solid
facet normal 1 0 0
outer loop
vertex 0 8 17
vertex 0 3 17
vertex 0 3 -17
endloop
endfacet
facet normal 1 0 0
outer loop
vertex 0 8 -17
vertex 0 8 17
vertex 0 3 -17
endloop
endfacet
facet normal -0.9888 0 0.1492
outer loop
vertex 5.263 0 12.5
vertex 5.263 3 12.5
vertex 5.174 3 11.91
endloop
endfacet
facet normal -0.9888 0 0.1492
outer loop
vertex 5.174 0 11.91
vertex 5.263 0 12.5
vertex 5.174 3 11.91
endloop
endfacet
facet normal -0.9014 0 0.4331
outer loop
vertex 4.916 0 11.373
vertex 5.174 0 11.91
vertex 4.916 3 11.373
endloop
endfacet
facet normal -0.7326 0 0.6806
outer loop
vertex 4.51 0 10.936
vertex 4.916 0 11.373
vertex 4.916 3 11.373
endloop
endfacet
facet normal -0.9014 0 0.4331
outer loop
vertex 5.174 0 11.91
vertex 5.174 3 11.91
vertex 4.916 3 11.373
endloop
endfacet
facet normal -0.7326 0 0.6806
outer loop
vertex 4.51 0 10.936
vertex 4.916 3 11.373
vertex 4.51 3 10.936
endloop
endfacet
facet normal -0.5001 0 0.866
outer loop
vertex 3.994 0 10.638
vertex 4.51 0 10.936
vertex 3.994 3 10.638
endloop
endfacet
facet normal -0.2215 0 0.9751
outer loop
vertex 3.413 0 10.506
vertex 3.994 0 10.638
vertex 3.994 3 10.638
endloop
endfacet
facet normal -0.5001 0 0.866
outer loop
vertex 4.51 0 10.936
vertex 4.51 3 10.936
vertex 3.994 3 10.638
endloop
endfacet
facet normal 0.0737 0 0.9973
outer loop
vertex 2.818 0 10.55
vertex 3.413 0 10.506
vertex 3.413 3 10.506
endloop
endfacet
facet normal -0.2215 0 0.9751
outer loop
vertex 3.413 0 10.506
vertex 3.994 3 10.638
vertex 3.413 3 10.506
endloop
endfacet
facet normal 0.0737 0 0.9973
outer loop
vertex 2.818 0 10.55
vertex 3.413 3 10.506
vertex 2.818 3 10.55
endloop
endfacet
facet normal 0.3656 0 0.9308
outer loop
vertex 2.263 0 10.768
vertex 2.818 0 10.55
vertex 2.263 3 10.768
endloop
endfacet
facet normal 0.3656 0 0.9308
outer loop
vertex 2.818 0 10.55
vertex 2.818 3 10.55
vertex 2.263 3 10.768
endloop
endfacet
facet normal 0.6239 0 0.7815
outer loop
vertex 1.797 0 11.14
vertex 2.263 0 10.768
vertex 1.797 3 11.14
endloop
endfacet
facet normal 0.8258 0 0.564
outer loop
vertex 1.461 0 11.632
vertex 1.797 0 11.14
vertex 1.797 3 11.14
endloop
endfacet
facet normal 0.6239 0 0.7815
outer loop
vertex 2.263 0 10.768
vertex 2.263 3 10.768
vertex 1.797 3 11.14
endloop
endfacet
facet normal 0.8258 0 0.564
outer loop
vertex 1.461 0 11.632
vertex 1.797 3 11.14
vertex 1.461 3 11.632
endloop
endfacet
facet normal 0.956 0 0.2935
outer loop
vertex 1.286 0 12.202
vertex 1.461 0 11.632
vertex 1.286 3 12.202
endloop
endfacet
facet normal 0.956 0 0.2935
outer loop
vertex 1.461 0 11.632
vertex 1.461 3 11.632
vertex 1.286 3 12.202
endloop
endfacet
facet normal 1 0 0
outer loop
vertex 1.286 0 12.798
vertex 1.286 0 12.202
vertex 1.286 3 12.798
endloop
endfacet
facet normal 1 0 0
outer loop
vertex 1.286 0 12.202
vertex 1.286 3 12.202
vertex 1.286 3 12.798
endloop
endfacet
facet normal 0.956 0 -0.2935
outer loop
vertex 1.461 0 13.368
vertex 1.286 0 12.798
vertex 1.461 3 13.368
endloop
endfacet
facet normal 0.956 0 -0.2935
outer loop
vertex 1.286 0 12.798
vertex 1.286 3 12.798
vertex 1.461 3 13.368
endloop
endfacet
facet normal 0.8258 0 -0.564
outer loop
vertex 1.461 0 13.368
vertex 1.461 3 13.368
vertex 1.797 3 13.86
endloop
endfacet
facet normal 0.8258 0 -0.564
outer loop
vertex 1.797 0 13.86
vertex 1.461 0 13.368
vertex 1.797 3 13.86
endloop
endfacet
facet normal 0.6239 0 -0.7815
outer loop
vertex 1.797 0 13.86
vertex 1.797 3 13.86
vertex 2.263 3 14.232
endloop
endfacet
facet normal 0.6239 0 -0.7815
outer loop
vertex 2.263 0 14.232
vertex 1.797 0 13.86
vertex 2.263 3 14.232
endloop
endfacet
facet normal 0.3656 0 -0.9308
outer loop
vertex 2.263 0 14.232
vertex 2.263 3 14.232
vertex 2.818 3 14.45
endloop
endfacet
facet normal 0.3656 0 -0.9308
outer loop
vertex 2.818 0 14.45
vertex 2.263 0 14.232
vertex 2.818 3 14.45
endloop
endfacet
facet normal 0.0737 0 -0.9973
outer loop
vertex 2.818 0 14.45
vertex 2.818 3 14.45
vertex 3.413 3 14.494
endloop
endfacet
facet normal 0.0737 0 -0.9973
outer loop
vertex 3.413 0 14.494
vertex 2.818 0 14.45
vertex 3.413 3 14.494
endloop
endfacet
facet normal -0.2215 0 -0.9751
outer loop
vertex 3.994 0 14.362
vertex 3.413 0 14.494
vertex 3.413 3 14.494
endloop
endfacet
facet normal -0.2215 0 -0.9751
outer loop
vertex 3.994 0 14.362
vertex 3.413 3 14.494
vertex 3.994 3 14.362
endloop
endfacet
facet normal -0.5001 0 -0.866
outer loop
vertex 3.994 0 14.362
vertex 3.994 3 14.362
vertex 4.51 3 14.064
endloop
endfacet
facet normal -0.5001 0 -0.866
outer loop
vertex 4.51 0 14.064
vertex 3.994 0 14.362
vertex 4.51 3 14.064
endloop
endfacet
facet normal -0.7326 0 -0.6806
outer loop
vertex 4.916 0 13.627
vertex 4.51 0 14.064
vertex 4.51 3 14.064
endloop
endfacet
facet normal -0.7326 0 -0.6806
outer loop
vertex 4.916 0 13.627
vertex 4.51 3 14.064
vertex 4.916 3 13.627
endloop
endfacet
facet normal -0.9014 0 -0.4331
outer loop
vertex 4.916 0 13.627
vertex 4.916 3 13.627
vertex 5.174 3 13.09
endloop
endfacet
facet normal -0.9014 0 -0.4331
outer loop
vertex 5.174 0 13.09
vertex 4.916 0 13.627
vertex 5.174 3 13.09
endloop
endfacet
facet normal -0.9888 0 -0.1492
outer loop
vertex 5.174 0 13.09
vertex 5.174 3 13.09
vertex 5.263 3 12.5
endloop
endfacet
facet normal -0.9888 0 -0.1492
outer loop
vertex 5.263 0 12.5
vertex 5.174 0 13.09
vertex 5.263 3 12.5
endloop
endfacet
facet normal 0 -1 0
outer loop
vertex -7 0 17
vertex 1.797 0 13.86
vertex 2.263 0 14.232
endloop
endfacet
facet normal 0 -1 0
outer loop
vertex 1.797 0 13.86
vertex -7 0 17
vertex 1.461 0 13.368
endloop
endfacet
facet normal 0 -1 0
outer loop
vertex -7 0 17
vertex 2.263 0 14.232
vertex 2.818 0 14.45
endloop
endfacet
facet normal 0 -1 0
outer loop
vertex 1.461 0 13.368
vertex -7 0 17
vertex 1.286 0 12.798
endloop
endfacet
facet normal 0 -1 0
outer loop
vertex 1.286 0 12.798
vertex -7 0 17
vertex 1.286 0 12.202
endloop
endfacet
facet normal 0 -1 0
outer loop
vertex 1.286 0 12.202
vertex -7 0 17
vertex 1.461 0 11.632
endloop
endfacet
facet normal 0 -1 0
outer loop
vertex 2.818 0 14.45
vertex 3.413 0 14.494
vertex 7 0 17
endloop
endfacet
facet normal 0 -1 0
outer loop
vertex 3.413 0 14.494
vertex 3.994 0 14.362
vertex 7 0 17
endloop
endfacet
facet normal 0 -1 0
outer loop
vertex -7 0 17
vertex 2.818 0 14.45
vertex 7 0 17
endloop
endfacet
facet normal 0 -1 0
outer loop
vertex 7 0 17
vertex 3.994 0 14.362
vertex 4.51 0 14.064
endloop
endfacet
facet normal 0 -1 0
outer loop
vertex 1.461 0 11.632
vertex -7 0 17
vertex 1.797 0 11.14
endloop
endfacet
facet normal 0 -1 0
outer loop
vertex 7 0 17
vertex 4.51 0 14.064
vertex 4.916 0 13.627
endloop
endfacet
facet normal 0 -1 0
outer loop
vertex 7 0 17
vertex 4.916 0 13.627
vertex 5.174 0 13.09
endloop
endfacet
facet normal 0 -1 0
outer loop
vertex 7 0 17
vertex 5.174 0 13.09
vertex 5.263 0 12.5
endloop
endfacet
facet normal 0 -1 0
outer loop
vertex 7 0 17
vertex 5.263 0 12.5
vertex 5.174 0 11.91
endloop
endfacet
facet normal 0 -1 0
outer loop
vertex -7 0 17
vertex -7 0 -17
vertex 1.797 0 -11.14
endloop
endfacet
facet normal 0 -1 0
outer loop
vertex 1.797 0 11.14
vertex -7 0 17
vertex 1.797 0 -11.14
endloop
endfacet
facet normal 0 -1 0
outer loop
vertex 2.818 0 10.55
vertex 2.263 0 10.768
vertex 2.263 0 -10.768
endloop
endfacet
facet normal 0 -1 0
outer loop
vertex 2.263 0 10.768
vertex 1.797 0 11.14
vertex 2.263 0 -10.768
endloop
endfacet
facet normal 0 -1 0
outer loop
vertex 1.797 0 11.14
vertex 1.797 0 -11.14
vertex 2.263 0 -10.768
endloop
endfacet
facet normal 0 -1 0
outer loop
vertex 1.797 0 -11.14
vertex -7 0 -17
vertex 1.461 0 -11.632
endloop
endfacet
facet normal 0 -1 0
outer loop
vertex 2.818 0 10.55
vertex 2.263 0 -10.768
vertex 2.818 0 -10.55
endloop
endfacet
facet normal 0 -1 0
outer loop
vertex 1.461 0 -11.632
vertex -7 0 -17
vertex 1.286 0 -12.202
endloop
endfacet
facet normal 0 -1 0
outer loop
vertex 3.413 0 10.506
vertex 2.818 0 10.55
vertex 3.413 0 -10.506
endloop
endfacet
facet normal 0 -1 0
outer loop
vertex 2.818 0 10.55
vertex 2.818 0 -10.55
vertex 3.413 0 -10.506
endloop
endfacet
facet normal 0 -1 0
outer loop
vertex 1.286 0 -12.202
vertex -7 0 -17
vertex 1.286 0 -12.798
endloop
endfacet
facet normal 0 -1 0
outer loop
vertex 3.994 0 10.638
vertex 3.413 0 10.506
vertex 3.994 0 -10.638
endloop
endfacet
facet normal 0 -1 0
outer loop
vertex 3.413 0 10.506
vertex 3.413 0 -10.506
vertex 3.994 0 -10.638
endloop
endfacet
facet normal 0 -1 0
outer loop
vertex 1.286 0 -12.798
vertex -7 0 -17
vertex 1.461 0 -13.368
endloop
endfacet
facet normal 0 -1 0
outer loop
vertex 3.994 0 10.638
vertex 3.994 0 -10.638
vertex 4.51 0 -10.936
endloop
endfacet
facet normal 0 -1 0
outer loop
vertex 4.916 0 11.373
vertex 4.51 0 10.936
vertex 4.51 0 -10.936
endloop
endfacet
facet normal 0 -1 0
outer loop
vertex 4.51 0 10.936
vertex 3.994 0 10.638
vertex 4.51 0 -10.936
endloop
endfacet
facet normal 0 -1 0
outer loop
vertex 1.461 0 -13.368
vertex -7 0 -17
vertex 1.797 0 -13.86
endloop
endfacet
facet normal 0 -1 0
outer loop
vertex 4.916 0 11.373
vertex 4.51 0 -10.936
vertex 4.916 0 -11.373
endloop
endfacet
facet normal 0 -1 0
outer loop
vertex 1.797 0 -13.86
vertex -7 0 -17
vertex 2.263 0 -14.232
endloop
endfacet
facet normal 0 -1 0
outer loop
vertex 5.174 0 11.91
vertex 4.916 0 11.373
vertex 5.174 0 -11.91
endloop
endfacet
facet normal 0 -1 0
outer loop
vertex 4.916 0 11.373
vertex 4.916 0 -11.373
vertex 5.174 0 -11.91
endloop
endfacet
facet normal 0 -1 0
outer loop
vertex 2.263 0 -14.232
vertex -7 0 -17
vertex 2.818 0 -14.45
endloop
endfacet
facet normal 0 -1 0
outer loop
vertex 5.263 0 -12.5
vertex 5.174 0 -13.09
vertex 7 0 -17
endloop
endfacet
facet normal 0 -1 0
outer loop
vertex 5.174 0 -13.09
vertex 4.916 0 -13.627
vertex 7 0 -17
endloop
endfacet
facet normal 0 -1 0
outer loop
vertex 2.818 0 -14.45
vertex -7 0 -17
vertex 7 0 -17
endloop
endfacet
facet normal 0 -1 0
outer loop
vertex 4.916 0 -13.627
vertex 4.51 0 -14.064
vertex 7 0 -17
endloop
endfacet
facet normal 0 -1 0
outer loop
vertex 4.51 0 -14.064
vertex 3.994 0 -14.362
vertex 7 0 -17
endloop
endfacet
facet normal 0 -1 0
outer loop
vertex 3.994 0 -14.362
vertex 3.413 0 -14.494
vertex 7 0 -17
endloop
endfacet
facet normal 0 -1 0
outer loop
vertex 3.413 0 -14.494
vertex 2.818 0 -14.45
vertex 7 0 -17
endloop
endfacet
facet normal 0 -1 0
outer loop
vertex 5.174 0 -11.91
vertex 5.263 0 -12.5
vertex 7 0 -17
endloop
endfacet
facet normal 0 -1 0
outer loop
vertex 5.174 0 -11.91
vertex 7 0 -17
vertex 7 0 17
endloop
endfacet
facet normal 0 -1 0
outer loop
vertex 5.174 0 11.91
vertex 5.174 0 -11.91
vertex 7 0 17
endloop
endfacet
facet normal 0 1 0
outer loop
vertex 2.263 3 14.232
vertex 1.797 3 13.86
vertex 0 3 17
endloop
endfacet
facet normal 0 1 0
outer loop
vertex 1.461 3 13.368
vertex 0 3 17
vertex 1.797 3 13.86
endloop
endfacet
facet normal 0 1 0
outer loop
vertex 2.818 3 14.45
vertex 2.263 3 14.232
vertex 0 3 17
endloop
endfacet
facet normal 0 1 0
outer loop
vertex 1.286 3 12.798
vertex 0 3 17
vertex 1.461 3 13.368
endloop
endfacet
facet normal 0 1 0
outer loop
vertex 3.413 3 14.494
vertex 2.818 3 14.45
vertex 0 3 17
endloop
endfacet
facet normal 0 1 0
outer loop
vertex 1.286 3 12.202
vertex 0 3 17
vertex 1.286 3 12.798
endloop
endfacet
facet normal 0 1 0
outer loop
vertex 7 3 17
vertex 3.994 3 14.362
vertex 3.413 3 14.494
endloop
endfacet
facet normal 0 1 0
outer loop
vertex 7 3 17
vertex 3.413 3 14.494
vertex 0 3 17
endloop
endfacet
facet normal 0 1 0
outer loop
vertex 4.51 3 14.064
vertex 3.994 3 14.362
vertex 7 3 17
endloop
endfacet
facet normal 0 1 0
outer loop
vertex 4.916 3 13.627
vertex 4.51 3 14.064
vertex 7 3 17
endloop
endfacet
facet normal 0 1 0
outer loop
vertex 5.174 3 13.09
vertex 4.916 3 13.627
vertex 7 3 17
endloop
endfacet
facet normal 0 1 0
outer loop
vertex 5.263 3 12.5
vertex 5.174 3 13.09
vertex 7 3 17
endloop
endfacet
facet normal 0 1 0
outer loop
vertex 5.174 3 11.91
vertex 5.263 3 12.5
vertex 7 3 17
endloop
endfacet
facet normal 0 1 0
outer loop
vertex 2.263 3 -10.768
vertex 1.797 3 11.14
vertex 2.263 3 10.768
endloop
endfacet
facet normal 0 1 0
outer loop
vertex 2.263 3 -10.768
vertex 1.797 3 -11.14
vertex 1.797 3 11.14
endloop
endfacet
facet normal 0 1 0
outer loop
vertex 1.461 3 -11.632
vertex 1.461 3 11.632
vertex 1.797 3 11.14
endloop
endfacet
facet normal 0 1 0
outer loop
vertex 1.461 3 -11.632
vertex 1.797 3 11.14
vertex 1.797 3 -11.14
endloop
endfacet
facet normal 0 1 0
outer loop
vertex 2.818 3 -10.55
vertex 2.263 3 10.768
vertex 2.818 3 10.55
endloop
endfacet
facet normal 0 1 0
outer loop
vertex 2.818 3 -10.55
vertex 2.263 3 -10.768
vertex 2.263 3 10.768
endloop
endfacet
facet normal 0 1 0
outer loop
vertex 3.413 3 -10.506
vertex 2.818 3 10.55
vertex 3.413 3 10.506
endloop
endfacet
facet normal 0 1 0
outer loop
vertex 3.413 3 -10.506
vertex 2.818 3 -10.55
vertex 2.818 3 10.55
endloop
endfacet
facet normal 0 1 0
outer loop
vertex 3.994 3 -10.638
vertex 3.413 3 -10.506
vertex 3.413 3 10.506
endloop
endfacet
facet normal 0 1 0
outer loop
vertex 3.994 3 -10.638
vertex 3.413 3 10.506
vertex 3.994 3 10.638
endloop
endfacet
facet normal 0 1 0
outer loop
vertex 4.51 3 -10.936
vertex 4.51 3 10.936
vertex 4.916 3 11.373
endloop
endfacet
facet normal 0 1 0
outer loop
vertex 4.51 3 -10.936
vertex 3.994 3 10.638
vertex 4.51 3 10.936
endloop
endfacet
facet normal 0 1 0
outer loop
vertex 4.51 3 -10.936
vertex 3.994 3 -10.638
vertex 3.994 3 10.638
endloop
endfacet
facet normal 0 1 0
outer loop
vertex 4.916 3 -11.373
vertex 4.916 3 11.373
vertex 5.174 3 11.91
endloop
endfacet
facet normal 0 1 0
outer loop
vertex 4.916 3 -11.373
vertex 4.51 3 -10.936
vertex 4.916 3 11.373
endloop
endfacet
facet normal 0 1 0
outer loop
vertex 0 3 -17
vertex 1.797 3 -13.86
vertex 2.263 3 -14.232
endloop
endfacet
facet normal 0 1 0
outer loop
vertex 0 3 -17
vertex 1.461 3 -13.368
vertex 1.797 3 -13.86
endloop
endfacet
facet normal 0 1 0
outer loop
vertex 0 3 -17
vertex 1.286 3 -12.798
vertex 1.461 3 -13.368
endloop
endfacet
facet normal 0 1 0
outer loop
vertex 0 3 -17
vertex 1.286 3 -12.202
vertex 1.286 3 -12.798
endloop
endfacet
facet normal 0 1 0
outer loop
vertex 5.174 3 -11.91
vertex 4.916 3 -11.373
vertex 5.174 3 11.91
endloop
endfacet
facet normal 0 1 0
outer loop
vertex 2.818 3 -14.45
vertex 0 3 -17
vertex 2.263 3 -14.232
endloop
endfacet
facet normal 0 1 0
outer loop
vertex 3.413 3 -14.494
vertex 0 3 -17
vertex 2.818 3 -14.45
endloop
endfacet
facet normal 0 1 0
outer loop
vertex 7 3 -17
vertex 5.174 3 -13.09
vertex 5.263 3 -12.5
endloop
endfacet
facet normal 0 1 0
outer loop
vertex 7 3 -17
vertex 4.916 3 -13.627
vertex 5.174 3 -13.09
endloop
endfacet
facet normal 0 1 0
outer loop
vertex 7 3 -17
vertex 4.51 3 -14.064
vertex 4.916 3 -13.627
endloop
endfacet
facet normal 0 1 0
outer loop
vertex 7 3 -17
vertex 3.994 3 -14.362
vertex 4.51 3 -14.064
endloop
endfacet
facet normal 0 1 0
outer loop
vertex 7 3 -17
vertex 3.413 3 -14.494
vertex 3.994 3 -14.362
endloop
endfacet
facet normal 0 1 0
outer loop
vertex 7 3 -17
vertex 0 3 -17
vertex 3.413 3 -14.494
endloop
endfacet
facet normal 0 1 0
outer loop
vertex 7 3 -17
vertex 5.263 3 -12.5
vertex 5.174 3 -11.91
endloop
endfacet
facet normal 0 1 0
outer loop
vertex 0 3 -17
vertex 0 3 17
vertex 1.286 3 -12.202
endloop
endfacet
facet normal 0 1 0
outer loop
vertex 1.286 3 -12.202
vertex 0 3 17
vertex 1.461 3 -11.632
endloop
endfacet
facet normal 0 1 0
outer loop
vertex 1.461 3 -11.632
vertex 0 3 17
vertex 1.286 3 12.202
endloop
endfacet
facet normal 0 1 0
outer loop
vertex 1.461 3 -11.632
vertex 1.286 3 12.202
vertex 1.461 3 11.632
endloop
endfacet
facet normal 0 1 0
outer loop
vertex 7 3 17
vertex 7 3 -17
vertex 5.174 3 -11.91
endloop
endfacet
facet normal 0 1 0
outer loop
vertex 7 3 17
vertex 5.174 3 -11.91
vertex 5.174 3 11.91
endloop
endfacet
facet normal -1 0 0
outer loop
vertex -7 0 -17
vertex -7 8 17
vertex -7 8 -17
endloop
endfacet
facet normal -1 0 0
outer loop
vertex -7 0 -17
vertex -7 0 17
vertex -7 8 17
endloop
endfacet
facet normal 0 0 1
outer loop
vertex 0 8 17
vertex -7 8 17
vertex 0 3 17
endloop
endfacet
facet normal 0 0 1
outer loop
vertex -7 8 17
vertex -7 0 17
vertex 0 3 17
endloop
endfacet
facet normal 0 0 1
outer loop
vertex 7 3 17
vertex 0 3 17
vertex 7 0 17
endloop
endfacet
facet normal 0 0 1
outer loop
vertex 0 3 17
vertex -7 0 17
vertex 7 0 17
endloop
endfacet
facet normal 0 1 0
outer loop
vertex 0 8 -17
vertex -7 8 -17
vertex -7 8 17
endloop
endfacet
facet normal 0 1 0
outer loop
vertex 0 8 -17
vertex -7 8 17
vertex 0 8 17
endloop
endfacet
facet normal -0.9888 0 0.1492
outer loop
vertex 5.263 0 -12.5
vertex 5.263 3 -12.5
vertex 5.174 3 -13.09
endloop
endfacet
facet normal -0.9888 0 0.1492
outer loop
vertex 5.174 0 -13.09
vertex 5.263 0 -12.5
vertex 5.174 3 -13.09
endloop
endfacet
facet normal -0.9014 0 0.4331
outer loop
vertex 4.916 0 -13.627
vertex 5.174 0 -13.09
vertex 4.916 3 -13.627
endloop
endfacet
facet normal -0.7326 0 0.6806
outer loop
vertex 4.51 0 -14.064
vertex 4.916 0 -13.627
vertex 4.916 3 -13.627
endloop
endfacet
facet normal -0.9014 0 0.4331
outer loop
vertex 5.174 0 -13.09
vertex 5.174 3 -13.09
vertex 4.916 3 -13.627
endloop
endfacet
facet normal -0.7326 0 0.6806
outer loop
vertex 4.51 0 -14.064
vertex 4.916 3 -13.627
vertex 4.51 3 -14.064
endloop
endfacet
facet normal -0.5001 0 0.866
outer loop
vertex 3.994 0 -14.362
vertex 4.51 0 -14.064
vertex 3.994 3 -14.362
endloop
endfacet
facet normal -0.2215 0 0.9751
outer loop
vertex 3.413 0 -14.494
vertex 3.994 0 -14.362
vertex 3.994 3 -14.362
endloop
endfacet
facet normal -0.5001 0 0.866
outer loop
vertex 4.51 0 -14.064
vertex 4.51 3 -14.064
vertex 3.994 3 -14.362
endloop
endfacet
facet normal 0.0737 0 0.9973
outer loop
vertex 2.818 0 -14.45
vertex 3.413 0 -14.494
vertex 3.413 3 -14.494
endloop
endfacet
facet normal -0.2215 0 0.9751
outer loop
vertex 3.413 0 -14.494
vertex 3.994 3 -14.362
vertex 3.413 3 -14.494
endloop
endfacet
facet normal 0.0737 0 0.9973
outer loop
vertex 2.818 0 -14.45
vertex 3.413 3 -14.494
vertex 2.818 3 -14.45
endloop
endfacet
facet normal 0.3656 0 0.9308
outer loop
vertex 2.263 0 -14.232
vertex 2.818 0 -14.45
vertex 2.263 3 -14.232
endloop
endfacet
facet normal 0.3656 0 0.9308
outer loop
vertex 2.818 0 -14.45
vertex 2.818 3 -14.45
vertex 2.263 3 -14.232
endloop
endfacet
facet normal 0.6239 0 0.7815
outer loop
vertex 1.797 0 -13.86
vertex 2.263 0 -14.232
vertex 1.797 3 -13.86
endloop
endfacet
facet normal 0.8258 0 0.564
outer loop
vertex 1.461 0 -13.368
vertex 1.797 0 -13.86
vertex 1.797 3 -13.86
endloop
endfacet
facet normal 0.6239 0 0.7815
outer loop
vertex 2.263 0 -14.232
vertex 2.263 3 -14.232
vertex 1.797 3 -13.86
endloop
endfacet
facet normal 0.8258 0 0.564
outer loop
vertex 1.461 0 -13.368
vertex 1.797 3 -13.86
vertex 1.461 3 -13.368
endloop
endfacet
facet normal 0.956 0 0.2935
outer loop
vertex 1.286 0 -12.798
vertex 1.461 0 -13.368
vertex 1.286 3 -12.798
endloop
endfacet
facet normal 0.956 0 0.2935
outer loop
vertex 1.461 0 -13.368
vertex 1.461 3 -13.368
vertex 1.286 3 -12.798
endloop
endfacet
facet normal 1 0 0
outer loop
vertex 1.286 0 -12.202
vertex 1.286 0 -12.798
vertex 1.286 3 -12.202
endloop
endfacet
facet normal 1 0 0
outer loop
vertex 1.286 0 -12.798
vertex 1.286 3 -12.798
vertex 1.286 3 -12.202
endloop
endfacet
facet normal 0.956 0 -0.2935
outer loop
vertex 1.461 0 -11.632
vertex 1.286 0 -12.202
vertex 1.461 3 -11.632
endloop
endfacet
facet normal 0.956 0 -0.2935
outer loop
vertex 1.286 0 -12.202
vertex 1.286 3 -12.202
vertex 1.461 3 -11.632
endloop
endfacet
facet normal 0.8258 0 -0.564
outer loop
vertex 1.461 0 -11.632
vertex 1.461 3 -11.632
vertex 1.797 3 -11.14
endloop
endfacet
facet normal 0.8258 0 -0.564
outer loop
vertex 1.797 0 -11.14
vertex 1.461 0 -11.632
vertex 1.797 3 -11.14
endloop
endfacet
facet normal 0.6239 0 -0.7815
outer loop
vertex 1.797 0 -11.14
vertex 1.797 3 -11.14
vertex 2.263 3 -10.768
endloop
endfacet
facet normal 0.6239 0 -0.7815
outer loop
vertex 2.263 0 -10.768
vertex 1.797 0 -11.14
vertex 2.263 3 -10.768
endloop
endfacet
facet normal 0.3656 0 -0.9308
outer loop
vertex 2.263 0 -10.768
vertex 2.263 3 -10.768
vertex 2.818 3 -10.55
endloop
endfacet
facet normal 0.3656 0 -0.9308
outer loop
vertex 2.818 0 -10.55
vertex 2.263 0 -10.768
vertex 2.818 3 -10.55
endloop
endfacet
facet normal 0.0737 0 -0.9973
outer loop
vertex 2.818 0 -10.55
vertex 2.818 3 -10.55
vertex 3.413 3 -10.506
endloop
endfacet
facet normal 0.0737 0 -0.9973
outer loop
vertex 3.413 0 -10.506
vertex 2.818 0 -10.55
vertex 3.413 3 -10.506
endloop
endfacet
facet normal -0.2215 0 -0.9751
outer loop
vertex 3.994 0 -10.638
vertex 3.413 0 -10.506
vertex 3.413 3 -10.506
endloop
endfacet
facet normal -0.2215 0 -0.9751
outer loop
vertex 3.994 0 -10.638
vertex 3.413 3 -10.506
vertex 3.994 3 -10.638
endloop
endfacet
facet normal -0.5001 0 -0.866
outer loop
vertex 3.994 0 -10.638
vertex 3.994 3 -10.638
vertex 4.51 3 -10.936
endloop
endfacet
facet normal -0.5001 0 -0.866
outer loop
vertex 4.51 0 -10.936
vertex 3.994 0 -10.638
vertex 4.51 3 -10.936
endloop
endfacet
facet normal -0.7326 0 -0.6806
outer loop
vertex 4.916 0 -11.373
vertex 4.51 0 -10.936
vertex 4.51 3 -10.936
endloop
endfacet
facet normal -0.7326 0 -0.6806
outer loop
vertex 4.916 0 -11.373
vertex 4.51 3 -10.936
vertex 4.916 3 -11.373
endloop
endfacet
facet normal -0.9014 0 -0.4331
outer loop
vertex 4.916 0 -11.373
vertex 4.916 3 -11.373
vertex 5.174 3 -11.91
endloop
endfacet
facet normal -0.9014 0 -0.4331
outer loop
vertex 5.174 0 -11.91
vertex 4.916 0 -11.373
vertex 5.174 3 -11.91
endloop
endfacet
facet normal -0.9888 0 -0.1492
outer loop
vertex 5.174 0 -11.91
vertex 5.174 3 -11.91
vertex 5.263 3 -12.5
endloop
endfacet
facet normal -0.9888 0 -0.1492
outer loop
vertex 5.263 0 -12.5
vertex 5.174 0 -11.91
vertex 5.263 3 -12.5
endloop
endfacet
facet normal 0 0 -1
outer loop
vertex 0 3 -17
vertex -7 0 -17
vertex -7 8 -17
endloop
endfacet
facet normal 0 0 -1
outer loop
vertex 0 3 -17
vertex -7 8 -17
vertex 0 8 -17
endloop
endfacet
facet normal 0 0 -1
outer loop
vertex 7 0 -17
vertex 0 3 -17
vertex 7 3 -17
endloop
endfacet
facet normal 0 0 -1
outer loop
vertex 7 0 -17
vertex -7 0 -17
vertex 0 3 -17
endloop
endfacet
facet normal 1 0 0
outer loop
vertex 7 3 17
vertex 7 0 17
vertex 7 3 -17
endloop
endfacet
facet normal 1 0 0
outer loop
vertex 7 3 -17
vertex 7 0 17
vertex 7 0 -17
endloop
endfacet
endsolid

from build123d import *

# Parameters (mm, degrees)
SKETCH1_W           = 14
SKETCH1_H           = 34
BOSS_EXTRUDE1_DEPTH = 3
SKETCH2_W           = 7
SKETCH2_H           = 34
BOSS_EXTRUDE2_DEPTH = 5
SKETCH3_R           = 2
CUT_EXTRUDE1_DEPTH  = 5


with BuildPart() as part:
    # Sketch1 → Boss-Extrude1 (new body)
    with BuildSketch(Plane(origin=(0, 0, 0), x_dir=(1, 0, 0), z_dir=(0, 1, 0))):
        Rectangle(SKETCH1_W, SKETCH1_H)
    extrude(amount=BOSS_EXTRUDE1_DEPTH)

    # Sketch2 → Boss-Extrude2 (add)
    with BuildSketch(Plane(origin=(0, 3, 0), x_dir=(1, 0, 0), z_dir=(0, 1, 0))):
        with Locations((-3.5, 0)):
            Rectangle(SKETCH2_W, SKETCH2_H)
    extrude(amount=BOSS_EXTRUDE2_DEPTH)

    # Sketch3 → Cut-Extrude1 (cut)
    with BuildSketch(Plane(origin=(0, 3, 0), x_dir=(1, 0, 0), z_dir=(0, 1, 0))):
        with Locations((3.263282708, -12.5)):
            Circle(SKETCH3_R)
        with Locations((3.263282708, 12.5)):
            Circle(SKETCH3_R)
    extrude(amount=-CUT_EXTRUDE1_DEPTH, mode=Mode.SUBTRACT)


solid = part.part
